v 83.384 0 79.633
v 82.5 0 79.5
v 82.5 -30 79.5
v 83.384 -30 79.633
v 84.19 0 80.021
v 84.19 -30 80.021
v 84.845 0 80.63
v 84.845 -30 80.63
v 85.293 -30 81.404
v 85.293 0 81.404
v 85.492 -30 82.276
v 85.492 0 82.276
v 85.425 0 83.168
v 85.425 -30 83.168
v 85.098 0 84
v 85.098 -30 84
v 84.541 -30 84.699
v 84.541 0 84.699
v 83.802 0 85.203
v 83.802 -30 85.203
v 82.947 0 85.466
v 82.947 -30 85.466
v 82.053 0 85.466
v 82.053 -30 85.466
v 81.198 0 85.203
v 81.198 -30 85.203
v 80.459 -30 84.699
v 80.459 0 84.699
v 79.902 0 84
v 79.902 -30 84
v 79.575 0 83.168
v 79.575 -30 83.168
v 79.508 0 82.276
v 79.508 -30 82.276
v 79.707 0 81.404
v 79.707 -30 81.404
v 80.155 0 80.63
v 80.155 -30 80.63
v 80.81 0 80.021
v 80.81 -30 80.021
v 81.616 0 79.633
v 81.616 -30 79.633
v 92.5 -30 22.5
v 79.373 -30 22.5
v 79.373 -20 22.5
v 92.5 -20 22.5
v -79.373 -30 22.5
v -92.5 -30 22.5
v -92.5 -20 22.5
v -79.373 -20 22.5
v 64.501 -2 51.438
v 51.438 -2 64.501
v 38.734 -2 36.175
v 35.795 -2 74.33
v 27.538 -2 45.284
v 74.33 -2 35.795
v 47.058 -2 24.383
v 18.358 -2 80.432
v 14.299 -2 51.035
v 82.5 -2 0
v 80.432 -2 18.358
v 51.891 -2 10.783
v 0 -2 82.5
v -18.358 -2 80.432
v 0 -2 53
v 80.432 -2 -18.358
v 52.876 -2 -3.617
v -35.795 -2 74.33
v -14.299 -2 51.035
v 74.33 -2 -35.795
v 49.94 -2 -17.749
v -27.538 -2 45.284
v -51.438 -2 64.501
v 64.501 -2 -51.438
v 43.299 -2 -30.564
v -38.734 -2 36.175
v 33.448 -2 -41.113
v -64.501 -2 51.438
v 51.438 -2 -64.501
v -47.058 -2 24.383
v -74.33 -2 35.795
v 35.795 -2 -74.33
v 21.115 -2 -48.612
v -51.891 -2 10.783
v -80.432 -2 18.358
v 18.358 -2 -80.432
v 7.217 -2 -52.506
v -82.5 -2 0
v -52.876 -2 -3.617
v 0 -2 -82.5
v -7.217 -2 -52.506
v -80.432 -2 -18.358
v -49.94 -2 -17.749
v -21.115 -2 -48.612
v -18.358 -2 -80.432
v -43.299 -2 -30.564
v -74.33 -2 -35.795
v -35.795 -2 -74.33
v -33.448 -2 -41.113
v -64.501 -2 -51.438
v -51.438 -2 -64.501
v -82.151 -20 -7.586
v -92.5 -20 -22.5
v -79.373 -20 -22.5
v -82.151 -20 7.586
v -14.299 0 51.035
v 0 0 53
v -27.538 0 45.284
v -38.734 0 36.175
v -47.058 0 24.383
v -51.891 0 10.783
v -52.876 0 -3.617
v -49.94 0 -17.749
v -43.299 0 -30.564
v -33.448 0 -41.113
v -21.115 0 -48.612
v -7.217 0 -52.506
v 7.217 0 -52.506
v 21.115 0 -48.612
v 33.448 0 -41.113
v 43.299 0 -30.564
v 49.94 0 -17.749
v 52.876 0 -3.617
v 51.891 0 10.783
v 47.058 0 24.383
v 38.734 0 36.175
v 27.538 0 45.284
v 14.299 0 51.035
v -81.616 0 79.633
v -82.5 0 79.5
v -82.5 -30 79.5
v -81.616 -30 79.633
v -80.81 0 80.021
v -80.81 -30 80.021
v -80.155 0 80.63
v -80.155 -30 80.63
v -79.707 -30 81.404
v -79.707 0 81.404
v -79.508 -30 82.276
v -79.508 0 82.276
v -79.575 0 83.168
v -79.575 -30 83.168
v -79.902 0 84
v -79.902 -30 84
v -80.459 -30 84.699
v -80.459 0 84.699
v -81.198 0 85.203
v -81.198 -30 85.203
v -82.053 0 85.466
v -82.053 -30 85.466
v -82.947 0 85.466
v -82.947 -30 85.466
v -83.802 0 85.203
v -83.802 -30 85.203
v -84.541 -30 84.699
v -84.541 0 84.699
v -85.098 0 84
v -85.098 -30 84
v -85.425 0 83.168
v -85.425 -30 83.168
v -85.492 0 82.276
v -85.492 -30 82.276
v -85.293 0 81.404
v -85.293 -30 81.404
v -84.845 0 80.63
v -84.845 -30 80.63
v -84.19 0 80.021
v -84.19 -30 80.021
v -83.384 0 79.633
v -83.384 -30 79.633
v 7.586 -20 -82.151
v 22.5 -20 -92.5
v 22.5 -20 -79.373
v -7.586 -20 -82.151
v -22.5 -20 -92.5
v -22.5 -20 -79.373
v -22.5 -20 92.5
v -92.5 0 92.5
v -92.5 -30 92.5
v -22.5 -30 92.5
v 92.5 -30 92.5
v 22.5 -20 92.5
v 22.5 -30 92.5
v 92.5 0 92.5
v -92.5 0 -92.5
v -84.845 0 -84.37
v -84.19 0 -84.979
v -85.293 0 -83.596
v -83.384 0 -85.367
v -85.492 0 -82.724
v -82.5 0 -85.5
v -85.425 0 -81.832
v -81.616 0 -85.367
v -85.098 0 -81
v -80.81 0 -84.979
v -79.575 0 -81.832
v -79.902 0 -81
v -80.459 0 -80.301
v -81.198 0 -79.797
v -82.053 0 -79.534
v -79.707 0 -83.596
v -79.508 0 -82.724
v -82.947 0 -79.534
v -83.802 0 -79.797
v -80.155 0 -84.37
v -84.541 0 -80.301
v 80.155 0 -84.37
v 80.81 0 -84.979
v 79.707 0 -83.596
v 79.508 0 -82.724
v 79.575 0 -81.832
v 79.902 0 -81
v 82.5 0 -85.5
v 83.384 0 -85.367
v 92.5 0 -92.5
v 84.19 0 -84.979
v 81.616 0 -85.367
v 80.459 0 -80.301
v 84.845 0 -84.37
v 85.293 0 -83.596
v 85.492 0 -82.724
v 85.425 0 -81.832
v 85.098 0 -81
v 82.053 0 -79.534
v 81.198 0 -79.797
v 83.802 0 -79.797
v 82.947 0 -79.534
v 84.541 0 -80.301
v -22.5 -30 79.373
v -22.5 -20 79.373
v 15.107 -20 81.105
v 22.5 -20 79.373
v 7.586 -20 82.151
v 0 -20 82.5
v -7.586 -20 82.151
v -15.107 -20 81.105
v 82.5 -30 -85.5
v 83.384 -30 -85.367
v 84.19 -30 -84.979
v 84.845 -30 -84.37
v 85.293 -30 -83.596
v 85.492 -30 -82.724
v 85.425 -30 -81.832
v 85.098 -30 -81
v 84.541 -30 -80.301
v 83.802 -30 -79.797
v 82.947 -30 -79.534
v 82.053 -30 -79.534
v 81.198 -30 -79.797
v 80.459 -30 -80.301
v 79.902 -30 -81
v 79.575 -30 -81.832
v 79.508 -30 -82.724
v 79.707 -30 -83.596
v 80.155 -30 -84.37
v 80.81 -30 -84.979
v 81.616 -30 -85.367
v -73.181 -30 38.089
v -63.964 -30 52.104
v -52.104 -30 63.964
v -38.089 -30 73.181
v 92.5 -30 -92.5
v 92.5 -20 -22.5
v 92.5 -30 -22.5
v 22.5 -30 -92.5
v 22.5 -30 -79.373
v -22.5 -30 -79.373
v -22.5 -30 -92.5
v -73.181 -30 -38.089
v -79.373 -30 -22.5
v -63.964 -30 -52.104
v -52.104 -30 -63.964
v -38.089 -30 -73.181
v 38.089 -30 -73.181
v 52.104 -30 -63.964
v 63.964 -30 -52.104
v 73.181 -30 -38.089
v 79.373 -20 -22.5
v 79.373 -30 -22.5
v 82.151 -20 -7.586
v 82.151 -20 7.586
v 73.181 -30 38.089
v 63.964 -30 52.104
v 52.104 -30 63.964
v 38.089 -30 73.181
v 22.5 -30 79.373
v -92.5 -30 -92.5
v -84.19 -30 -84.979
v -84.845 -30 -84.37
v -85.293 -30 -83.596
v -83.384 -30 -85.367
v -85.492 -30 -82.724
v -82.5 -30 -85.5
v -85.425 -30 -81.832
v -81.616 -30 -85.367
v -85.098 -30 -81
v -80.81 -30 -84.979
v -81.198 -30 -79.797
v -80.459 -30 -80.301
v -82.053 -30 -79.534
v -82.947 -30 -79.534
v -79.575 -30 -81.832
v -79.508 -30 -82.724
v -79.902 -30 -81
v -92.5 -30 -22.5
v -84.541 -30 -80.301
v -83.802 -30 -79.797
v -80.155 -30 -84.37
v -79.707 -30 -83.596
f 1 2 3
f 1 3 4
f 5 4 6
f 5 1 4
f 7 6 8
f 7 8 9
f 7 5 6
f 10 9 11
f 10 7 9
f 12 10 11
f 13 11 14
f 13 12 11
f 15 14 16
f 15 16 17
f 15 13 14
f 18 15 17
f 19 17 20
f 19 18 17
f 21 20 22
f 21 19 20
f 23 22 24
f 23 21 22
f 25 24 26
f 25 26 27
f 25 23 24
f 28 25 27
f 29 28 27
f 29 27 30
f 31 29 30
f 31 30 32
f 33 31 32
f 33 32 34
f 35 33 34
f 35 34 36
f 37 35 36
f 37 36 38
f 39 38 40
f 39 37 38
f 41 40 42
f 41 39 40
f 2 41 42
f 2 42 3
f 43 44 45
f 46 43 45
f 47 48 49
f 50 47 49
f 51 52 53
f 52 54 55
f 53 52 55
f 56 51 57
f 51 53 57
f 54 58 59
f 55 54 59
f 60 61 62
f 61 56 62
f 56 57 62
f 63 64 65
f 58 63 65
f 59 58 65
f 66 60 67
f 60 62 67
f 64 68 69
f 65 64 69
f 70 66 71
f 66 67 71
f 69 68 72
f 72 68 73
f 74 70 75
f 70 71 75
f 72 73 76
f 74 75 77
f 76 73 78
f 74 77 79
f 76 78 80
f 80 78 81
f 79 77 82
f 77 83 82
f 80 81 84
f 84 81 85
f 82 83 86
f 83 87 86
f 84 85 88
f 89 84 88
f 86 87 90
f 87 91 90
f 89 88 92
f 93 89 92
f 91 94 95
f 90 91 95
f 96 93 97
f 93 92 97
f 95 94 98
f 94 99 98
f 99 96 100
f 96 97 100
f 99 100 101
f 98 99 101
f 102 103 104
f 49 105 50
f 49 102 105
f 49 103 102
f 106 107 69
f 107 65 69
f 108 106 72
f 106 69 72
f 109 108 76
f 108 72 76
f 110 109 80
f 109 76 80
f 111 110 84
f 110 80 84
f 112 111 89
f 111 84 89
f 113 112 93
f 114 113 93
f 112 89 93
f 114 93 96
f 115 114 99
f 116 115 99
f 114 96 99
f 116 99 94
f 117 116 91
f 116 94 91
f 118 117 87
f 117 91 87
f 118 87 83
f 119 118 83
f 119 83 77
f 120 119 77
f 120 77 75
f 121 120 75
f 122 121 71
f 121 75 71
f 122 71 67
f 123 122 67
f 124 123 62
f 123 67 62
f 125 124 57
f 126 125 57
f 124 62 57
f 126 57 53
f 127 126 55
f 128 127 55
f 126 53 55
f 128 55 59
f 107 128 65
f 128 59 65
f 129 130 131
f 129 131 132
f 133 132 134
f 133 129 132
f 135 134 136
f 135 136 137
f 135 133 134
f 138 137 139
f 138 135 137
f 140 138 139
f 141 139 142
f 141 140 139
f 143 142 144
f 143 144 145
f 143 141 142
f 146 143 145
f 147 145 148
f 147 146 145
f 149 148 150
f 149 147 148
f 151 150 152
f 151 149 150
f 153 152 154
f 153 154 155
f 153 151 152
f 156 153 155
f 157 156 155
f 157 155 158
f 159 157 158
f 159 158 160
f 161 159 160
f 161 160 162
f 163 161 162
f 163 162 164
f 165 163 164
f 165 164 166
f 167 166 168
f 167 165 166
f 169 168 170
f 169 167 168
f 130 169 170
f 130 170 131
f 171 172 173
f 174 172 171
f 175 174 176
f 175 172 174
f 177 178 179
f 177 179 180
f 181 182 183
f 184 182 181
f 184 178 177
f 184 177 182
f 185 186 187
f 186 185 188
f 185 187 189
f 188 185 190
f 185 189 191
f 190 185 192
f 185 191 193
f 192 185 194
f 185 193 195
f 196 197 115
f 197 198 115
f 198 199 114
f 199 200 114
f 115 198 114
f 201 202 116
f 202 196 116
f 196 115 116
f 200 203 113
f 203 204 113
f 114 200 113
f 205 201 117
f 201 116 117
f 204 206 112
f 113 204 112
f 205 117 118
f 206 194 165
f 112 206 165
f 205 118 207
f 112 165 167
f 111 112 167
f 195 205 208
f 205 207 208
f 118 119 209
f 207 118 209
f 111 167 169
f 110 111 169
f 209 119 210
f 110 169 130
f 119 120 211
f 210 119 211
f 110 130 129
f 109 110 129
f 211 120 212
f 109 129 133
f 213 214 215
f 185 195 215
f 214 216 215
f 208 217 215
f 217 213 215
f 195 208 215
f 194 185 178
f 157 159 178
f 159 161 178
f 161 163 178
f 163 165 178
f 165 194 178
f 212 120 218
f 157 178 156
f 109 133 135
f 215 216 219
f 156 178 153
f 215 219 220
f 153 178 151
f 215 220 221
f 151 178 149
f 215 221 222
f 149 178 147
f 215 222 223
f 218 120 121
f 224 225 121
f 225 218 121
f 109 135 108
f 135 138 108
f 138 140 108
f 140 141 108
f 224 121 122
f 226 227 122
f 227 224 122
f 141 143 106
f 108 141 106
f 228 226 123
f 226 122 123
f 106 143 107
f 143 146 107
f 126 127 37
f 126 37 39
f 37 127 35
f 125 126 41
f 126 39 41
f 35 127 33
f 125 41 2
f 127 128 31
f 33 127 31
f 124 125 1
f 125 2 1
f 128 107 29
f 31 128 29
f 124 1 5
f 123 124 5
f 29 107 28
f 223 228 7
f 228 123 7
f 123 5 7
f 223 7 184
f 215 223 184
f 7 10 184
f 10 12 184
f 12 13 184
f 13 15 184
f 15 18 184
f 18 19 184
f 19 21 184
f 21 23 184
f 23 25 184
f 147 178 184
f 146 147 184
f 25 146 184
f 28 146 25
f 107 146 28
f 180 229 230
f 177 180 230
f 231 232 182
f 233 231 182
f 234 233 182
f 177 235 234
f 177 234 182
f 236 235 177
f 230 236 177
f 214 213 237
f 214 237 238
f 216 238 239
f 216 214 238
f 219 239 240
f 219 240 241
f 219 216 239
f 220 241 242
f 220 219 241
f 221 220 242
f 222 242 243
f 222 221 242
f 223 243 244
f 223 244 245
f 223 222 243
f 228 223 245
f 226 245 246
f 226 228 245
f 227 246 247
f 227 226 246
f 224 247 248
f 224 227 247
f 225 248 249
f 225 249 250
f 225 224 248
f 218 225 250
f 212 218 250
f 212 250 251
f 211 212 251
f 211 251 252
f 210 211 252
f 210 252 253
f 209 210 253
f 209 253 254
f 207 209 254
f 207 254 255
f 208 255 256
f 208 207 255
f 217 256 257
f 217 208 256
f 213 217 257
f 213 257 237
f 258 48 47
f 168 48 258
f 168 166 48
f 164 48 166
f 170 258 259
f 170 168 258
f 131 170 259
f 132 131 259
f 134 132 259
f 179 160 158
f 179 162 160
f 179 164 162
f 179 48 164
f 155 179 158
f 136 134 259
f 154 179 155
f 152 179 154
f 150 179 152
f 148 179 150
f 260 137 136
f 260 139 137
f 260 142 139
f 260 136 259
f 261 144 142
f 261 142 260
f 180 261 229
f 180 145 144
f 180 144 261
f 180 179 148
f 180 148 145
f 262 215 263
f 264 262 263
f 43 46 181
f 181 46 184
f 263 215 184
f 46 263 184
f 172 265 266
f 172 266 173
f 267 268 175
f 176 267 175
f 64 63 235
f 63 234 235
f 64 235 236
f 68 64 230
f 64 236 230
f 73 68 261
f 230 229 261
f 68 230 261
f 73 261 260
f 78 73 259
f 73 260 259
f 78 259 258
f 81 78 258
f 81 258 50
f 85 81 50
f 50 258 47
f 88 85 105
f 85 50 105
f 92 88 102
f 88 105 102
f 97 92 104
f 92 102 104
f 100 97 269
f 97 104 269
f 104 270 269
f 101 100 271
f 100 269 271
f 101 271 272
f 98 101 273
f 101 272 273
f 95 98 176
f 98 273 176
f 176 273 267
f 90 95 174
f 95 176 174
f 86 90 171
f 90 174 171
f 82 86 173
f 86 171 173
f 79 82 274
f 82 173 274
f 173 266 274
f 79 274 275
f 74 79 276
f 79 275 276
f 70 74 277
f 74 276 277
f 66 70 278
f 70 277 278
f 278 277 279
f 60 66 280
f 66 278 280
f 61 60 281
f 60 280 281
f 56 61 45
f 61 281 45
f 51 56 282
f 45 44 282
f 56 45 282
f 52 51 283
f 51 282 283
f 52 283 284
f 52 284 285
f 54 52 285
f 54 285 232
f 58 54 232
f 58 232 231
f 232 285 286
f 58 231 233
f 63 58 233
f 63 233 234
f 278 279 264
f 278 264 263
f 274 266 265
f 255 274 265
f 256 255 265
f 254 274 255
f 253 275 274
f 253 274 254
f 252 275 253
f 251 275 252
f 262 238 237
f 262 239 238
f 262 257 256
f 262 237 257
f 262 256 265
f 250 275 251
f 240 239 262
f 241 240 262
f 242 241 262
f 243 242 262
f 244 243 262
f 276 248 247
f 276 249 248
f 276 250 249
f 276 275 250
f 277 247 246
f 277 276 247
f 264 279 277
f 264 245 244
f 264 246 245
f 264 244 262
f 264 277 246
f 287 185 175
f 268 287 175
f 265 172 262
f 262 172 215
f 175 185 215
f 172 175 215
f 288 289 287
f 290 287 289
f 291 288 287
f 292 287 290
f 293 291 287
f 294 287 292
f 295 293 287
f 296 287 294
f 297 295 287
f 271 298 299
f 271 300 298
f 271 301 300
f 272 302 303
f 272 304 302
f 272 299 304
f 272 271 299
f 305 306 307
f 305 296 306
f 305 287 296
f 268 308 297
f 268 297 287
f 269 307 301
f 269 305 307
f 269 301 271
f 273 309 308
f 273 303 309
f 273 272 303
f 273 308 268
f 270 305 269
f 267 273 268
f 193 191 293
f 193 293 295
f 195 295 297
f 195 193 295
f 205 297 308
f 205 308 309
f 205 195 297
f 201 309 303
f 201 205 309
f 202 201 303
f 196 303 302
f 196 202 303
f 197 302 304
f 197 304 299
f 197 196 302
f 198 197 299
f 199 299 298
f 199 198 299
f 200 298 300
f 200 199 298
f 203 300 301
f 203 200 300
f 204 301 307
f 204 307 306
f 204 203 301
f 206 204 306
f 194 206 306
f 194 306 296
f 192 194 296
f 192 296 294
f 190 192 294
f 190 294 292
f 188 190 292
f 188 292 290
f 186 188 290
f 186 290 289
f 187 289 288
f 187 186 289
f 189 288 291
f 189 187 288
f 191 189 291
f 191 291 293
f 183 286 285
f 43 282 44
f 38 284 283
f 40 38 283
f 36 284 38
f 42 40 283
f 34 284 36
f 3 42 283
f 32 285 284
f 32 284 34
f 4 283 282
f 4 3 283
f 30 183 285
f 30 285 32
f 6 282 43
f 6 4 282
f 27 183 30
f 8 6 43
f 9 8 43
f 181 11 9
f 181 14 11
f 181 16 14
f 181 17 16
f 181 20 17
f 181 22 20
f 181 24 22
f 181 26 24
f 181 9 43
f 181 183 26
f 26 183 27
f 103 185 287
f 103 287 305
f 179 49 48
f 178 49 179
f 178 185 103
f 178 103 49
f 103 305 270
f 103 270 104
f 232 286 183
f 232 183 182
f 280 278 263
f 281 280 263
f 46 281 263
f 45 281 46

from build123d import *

# Parameters (mm, degrees)
BOSS_EXTRUDE1_START = -30
SKETCH2_W           = 185
SKETCH2_H           = 185
SKETCH2_R           = 85.5
SKETCH2_R_2         = 3
BOSS_EXTRUDE1_DEPTH = 30
SKETCH3_W           = 45
SKETCH3_H           = 10
CUT_EXTRUDE1_DEPTH  = 210.000598085
SKETCH4_W           = 45
SKETCH4_H           = 10
CUT_EXTRUDE2_DEPTH  = 210.000598085


with BuildPart() as part:
    # Sketch1 → Revolve1 (revolve)
    with BuildSketch(Plane.XY, mode=Mode.PRIVATE) as revolve1_sk:
        Polygon((53, -2), (82.5, -2), (82.5, -30), (85.5, -30), (85.5, 0), (53, 0), align=None)
    revolve(revolve1_sk.sketch.rotate(Axis((0, 0, 0), (0, -1, 0)), 90), axis=Axis((0, 0, 0), (0, -1, 0)))

    # Sketch2 → Boss-Extrude1 (add)
    with BuildSketch(Plane.XZ.offset(30).offset(BOSS_EXTRUDE1_START)):
        Rectangle(SKETCH2_W, SKETCH2_H)
        Circle(SKETCH2_R, mode=Mode.SUBTRACT)
        with Locations(Location((-82.5, -82.5, 0), (0, 0, 270))):
            Circle(SKETCH2_R_2, mode=Mode.SUBTRACT)
        with Locations(Location((82.5, -82.5, 0), (0, 0, 270))):
            Circle(SKETCH2_R_2, mode=Mode.SUBTRACT)
        with Locations(Location((82.5, 82.5, 0), (0, 0, 270))):
            Circle(SKETCH2_R_2, mode=Mode.SUBTRACT)
        with Locations(Location((-82.5, 82.5, 0), (0, 0, 270))):
            Circle(SKETCH2_R_2, mode=Mode.SUBTRACT)
    extrude(amount=BOSS_EXTRUDE1_DEPTH)

    # Sketch3 → Cut-Extrude1 (cut, through all)
    with BuildSketch(Plane.ZY.offset(92.5)):
        with Locations((0, -25)):
            Rectangle(SKETCH3_W, SKETCH3_H)
    extrude(amount=-CUT_EXTRUDE1_DEPTH, mode=Mode.SUBTRACT)

    # Sketch4 → Cut-Extrude2 (cut, through all)
    with BuildSketch(Plane(origin=(0, 0, -92.5), x_dir=(-1, 0, 0), z_dir=(0, 0, -1))):
        with Locations((0, -25)):
            Rectangle(SKETCH4_W, SKETCH4_H)
    extrude(amount=-CUT_EXTRUDE2_DEPTH, mode=Mode.SUBTRACT)


solid = part.part
